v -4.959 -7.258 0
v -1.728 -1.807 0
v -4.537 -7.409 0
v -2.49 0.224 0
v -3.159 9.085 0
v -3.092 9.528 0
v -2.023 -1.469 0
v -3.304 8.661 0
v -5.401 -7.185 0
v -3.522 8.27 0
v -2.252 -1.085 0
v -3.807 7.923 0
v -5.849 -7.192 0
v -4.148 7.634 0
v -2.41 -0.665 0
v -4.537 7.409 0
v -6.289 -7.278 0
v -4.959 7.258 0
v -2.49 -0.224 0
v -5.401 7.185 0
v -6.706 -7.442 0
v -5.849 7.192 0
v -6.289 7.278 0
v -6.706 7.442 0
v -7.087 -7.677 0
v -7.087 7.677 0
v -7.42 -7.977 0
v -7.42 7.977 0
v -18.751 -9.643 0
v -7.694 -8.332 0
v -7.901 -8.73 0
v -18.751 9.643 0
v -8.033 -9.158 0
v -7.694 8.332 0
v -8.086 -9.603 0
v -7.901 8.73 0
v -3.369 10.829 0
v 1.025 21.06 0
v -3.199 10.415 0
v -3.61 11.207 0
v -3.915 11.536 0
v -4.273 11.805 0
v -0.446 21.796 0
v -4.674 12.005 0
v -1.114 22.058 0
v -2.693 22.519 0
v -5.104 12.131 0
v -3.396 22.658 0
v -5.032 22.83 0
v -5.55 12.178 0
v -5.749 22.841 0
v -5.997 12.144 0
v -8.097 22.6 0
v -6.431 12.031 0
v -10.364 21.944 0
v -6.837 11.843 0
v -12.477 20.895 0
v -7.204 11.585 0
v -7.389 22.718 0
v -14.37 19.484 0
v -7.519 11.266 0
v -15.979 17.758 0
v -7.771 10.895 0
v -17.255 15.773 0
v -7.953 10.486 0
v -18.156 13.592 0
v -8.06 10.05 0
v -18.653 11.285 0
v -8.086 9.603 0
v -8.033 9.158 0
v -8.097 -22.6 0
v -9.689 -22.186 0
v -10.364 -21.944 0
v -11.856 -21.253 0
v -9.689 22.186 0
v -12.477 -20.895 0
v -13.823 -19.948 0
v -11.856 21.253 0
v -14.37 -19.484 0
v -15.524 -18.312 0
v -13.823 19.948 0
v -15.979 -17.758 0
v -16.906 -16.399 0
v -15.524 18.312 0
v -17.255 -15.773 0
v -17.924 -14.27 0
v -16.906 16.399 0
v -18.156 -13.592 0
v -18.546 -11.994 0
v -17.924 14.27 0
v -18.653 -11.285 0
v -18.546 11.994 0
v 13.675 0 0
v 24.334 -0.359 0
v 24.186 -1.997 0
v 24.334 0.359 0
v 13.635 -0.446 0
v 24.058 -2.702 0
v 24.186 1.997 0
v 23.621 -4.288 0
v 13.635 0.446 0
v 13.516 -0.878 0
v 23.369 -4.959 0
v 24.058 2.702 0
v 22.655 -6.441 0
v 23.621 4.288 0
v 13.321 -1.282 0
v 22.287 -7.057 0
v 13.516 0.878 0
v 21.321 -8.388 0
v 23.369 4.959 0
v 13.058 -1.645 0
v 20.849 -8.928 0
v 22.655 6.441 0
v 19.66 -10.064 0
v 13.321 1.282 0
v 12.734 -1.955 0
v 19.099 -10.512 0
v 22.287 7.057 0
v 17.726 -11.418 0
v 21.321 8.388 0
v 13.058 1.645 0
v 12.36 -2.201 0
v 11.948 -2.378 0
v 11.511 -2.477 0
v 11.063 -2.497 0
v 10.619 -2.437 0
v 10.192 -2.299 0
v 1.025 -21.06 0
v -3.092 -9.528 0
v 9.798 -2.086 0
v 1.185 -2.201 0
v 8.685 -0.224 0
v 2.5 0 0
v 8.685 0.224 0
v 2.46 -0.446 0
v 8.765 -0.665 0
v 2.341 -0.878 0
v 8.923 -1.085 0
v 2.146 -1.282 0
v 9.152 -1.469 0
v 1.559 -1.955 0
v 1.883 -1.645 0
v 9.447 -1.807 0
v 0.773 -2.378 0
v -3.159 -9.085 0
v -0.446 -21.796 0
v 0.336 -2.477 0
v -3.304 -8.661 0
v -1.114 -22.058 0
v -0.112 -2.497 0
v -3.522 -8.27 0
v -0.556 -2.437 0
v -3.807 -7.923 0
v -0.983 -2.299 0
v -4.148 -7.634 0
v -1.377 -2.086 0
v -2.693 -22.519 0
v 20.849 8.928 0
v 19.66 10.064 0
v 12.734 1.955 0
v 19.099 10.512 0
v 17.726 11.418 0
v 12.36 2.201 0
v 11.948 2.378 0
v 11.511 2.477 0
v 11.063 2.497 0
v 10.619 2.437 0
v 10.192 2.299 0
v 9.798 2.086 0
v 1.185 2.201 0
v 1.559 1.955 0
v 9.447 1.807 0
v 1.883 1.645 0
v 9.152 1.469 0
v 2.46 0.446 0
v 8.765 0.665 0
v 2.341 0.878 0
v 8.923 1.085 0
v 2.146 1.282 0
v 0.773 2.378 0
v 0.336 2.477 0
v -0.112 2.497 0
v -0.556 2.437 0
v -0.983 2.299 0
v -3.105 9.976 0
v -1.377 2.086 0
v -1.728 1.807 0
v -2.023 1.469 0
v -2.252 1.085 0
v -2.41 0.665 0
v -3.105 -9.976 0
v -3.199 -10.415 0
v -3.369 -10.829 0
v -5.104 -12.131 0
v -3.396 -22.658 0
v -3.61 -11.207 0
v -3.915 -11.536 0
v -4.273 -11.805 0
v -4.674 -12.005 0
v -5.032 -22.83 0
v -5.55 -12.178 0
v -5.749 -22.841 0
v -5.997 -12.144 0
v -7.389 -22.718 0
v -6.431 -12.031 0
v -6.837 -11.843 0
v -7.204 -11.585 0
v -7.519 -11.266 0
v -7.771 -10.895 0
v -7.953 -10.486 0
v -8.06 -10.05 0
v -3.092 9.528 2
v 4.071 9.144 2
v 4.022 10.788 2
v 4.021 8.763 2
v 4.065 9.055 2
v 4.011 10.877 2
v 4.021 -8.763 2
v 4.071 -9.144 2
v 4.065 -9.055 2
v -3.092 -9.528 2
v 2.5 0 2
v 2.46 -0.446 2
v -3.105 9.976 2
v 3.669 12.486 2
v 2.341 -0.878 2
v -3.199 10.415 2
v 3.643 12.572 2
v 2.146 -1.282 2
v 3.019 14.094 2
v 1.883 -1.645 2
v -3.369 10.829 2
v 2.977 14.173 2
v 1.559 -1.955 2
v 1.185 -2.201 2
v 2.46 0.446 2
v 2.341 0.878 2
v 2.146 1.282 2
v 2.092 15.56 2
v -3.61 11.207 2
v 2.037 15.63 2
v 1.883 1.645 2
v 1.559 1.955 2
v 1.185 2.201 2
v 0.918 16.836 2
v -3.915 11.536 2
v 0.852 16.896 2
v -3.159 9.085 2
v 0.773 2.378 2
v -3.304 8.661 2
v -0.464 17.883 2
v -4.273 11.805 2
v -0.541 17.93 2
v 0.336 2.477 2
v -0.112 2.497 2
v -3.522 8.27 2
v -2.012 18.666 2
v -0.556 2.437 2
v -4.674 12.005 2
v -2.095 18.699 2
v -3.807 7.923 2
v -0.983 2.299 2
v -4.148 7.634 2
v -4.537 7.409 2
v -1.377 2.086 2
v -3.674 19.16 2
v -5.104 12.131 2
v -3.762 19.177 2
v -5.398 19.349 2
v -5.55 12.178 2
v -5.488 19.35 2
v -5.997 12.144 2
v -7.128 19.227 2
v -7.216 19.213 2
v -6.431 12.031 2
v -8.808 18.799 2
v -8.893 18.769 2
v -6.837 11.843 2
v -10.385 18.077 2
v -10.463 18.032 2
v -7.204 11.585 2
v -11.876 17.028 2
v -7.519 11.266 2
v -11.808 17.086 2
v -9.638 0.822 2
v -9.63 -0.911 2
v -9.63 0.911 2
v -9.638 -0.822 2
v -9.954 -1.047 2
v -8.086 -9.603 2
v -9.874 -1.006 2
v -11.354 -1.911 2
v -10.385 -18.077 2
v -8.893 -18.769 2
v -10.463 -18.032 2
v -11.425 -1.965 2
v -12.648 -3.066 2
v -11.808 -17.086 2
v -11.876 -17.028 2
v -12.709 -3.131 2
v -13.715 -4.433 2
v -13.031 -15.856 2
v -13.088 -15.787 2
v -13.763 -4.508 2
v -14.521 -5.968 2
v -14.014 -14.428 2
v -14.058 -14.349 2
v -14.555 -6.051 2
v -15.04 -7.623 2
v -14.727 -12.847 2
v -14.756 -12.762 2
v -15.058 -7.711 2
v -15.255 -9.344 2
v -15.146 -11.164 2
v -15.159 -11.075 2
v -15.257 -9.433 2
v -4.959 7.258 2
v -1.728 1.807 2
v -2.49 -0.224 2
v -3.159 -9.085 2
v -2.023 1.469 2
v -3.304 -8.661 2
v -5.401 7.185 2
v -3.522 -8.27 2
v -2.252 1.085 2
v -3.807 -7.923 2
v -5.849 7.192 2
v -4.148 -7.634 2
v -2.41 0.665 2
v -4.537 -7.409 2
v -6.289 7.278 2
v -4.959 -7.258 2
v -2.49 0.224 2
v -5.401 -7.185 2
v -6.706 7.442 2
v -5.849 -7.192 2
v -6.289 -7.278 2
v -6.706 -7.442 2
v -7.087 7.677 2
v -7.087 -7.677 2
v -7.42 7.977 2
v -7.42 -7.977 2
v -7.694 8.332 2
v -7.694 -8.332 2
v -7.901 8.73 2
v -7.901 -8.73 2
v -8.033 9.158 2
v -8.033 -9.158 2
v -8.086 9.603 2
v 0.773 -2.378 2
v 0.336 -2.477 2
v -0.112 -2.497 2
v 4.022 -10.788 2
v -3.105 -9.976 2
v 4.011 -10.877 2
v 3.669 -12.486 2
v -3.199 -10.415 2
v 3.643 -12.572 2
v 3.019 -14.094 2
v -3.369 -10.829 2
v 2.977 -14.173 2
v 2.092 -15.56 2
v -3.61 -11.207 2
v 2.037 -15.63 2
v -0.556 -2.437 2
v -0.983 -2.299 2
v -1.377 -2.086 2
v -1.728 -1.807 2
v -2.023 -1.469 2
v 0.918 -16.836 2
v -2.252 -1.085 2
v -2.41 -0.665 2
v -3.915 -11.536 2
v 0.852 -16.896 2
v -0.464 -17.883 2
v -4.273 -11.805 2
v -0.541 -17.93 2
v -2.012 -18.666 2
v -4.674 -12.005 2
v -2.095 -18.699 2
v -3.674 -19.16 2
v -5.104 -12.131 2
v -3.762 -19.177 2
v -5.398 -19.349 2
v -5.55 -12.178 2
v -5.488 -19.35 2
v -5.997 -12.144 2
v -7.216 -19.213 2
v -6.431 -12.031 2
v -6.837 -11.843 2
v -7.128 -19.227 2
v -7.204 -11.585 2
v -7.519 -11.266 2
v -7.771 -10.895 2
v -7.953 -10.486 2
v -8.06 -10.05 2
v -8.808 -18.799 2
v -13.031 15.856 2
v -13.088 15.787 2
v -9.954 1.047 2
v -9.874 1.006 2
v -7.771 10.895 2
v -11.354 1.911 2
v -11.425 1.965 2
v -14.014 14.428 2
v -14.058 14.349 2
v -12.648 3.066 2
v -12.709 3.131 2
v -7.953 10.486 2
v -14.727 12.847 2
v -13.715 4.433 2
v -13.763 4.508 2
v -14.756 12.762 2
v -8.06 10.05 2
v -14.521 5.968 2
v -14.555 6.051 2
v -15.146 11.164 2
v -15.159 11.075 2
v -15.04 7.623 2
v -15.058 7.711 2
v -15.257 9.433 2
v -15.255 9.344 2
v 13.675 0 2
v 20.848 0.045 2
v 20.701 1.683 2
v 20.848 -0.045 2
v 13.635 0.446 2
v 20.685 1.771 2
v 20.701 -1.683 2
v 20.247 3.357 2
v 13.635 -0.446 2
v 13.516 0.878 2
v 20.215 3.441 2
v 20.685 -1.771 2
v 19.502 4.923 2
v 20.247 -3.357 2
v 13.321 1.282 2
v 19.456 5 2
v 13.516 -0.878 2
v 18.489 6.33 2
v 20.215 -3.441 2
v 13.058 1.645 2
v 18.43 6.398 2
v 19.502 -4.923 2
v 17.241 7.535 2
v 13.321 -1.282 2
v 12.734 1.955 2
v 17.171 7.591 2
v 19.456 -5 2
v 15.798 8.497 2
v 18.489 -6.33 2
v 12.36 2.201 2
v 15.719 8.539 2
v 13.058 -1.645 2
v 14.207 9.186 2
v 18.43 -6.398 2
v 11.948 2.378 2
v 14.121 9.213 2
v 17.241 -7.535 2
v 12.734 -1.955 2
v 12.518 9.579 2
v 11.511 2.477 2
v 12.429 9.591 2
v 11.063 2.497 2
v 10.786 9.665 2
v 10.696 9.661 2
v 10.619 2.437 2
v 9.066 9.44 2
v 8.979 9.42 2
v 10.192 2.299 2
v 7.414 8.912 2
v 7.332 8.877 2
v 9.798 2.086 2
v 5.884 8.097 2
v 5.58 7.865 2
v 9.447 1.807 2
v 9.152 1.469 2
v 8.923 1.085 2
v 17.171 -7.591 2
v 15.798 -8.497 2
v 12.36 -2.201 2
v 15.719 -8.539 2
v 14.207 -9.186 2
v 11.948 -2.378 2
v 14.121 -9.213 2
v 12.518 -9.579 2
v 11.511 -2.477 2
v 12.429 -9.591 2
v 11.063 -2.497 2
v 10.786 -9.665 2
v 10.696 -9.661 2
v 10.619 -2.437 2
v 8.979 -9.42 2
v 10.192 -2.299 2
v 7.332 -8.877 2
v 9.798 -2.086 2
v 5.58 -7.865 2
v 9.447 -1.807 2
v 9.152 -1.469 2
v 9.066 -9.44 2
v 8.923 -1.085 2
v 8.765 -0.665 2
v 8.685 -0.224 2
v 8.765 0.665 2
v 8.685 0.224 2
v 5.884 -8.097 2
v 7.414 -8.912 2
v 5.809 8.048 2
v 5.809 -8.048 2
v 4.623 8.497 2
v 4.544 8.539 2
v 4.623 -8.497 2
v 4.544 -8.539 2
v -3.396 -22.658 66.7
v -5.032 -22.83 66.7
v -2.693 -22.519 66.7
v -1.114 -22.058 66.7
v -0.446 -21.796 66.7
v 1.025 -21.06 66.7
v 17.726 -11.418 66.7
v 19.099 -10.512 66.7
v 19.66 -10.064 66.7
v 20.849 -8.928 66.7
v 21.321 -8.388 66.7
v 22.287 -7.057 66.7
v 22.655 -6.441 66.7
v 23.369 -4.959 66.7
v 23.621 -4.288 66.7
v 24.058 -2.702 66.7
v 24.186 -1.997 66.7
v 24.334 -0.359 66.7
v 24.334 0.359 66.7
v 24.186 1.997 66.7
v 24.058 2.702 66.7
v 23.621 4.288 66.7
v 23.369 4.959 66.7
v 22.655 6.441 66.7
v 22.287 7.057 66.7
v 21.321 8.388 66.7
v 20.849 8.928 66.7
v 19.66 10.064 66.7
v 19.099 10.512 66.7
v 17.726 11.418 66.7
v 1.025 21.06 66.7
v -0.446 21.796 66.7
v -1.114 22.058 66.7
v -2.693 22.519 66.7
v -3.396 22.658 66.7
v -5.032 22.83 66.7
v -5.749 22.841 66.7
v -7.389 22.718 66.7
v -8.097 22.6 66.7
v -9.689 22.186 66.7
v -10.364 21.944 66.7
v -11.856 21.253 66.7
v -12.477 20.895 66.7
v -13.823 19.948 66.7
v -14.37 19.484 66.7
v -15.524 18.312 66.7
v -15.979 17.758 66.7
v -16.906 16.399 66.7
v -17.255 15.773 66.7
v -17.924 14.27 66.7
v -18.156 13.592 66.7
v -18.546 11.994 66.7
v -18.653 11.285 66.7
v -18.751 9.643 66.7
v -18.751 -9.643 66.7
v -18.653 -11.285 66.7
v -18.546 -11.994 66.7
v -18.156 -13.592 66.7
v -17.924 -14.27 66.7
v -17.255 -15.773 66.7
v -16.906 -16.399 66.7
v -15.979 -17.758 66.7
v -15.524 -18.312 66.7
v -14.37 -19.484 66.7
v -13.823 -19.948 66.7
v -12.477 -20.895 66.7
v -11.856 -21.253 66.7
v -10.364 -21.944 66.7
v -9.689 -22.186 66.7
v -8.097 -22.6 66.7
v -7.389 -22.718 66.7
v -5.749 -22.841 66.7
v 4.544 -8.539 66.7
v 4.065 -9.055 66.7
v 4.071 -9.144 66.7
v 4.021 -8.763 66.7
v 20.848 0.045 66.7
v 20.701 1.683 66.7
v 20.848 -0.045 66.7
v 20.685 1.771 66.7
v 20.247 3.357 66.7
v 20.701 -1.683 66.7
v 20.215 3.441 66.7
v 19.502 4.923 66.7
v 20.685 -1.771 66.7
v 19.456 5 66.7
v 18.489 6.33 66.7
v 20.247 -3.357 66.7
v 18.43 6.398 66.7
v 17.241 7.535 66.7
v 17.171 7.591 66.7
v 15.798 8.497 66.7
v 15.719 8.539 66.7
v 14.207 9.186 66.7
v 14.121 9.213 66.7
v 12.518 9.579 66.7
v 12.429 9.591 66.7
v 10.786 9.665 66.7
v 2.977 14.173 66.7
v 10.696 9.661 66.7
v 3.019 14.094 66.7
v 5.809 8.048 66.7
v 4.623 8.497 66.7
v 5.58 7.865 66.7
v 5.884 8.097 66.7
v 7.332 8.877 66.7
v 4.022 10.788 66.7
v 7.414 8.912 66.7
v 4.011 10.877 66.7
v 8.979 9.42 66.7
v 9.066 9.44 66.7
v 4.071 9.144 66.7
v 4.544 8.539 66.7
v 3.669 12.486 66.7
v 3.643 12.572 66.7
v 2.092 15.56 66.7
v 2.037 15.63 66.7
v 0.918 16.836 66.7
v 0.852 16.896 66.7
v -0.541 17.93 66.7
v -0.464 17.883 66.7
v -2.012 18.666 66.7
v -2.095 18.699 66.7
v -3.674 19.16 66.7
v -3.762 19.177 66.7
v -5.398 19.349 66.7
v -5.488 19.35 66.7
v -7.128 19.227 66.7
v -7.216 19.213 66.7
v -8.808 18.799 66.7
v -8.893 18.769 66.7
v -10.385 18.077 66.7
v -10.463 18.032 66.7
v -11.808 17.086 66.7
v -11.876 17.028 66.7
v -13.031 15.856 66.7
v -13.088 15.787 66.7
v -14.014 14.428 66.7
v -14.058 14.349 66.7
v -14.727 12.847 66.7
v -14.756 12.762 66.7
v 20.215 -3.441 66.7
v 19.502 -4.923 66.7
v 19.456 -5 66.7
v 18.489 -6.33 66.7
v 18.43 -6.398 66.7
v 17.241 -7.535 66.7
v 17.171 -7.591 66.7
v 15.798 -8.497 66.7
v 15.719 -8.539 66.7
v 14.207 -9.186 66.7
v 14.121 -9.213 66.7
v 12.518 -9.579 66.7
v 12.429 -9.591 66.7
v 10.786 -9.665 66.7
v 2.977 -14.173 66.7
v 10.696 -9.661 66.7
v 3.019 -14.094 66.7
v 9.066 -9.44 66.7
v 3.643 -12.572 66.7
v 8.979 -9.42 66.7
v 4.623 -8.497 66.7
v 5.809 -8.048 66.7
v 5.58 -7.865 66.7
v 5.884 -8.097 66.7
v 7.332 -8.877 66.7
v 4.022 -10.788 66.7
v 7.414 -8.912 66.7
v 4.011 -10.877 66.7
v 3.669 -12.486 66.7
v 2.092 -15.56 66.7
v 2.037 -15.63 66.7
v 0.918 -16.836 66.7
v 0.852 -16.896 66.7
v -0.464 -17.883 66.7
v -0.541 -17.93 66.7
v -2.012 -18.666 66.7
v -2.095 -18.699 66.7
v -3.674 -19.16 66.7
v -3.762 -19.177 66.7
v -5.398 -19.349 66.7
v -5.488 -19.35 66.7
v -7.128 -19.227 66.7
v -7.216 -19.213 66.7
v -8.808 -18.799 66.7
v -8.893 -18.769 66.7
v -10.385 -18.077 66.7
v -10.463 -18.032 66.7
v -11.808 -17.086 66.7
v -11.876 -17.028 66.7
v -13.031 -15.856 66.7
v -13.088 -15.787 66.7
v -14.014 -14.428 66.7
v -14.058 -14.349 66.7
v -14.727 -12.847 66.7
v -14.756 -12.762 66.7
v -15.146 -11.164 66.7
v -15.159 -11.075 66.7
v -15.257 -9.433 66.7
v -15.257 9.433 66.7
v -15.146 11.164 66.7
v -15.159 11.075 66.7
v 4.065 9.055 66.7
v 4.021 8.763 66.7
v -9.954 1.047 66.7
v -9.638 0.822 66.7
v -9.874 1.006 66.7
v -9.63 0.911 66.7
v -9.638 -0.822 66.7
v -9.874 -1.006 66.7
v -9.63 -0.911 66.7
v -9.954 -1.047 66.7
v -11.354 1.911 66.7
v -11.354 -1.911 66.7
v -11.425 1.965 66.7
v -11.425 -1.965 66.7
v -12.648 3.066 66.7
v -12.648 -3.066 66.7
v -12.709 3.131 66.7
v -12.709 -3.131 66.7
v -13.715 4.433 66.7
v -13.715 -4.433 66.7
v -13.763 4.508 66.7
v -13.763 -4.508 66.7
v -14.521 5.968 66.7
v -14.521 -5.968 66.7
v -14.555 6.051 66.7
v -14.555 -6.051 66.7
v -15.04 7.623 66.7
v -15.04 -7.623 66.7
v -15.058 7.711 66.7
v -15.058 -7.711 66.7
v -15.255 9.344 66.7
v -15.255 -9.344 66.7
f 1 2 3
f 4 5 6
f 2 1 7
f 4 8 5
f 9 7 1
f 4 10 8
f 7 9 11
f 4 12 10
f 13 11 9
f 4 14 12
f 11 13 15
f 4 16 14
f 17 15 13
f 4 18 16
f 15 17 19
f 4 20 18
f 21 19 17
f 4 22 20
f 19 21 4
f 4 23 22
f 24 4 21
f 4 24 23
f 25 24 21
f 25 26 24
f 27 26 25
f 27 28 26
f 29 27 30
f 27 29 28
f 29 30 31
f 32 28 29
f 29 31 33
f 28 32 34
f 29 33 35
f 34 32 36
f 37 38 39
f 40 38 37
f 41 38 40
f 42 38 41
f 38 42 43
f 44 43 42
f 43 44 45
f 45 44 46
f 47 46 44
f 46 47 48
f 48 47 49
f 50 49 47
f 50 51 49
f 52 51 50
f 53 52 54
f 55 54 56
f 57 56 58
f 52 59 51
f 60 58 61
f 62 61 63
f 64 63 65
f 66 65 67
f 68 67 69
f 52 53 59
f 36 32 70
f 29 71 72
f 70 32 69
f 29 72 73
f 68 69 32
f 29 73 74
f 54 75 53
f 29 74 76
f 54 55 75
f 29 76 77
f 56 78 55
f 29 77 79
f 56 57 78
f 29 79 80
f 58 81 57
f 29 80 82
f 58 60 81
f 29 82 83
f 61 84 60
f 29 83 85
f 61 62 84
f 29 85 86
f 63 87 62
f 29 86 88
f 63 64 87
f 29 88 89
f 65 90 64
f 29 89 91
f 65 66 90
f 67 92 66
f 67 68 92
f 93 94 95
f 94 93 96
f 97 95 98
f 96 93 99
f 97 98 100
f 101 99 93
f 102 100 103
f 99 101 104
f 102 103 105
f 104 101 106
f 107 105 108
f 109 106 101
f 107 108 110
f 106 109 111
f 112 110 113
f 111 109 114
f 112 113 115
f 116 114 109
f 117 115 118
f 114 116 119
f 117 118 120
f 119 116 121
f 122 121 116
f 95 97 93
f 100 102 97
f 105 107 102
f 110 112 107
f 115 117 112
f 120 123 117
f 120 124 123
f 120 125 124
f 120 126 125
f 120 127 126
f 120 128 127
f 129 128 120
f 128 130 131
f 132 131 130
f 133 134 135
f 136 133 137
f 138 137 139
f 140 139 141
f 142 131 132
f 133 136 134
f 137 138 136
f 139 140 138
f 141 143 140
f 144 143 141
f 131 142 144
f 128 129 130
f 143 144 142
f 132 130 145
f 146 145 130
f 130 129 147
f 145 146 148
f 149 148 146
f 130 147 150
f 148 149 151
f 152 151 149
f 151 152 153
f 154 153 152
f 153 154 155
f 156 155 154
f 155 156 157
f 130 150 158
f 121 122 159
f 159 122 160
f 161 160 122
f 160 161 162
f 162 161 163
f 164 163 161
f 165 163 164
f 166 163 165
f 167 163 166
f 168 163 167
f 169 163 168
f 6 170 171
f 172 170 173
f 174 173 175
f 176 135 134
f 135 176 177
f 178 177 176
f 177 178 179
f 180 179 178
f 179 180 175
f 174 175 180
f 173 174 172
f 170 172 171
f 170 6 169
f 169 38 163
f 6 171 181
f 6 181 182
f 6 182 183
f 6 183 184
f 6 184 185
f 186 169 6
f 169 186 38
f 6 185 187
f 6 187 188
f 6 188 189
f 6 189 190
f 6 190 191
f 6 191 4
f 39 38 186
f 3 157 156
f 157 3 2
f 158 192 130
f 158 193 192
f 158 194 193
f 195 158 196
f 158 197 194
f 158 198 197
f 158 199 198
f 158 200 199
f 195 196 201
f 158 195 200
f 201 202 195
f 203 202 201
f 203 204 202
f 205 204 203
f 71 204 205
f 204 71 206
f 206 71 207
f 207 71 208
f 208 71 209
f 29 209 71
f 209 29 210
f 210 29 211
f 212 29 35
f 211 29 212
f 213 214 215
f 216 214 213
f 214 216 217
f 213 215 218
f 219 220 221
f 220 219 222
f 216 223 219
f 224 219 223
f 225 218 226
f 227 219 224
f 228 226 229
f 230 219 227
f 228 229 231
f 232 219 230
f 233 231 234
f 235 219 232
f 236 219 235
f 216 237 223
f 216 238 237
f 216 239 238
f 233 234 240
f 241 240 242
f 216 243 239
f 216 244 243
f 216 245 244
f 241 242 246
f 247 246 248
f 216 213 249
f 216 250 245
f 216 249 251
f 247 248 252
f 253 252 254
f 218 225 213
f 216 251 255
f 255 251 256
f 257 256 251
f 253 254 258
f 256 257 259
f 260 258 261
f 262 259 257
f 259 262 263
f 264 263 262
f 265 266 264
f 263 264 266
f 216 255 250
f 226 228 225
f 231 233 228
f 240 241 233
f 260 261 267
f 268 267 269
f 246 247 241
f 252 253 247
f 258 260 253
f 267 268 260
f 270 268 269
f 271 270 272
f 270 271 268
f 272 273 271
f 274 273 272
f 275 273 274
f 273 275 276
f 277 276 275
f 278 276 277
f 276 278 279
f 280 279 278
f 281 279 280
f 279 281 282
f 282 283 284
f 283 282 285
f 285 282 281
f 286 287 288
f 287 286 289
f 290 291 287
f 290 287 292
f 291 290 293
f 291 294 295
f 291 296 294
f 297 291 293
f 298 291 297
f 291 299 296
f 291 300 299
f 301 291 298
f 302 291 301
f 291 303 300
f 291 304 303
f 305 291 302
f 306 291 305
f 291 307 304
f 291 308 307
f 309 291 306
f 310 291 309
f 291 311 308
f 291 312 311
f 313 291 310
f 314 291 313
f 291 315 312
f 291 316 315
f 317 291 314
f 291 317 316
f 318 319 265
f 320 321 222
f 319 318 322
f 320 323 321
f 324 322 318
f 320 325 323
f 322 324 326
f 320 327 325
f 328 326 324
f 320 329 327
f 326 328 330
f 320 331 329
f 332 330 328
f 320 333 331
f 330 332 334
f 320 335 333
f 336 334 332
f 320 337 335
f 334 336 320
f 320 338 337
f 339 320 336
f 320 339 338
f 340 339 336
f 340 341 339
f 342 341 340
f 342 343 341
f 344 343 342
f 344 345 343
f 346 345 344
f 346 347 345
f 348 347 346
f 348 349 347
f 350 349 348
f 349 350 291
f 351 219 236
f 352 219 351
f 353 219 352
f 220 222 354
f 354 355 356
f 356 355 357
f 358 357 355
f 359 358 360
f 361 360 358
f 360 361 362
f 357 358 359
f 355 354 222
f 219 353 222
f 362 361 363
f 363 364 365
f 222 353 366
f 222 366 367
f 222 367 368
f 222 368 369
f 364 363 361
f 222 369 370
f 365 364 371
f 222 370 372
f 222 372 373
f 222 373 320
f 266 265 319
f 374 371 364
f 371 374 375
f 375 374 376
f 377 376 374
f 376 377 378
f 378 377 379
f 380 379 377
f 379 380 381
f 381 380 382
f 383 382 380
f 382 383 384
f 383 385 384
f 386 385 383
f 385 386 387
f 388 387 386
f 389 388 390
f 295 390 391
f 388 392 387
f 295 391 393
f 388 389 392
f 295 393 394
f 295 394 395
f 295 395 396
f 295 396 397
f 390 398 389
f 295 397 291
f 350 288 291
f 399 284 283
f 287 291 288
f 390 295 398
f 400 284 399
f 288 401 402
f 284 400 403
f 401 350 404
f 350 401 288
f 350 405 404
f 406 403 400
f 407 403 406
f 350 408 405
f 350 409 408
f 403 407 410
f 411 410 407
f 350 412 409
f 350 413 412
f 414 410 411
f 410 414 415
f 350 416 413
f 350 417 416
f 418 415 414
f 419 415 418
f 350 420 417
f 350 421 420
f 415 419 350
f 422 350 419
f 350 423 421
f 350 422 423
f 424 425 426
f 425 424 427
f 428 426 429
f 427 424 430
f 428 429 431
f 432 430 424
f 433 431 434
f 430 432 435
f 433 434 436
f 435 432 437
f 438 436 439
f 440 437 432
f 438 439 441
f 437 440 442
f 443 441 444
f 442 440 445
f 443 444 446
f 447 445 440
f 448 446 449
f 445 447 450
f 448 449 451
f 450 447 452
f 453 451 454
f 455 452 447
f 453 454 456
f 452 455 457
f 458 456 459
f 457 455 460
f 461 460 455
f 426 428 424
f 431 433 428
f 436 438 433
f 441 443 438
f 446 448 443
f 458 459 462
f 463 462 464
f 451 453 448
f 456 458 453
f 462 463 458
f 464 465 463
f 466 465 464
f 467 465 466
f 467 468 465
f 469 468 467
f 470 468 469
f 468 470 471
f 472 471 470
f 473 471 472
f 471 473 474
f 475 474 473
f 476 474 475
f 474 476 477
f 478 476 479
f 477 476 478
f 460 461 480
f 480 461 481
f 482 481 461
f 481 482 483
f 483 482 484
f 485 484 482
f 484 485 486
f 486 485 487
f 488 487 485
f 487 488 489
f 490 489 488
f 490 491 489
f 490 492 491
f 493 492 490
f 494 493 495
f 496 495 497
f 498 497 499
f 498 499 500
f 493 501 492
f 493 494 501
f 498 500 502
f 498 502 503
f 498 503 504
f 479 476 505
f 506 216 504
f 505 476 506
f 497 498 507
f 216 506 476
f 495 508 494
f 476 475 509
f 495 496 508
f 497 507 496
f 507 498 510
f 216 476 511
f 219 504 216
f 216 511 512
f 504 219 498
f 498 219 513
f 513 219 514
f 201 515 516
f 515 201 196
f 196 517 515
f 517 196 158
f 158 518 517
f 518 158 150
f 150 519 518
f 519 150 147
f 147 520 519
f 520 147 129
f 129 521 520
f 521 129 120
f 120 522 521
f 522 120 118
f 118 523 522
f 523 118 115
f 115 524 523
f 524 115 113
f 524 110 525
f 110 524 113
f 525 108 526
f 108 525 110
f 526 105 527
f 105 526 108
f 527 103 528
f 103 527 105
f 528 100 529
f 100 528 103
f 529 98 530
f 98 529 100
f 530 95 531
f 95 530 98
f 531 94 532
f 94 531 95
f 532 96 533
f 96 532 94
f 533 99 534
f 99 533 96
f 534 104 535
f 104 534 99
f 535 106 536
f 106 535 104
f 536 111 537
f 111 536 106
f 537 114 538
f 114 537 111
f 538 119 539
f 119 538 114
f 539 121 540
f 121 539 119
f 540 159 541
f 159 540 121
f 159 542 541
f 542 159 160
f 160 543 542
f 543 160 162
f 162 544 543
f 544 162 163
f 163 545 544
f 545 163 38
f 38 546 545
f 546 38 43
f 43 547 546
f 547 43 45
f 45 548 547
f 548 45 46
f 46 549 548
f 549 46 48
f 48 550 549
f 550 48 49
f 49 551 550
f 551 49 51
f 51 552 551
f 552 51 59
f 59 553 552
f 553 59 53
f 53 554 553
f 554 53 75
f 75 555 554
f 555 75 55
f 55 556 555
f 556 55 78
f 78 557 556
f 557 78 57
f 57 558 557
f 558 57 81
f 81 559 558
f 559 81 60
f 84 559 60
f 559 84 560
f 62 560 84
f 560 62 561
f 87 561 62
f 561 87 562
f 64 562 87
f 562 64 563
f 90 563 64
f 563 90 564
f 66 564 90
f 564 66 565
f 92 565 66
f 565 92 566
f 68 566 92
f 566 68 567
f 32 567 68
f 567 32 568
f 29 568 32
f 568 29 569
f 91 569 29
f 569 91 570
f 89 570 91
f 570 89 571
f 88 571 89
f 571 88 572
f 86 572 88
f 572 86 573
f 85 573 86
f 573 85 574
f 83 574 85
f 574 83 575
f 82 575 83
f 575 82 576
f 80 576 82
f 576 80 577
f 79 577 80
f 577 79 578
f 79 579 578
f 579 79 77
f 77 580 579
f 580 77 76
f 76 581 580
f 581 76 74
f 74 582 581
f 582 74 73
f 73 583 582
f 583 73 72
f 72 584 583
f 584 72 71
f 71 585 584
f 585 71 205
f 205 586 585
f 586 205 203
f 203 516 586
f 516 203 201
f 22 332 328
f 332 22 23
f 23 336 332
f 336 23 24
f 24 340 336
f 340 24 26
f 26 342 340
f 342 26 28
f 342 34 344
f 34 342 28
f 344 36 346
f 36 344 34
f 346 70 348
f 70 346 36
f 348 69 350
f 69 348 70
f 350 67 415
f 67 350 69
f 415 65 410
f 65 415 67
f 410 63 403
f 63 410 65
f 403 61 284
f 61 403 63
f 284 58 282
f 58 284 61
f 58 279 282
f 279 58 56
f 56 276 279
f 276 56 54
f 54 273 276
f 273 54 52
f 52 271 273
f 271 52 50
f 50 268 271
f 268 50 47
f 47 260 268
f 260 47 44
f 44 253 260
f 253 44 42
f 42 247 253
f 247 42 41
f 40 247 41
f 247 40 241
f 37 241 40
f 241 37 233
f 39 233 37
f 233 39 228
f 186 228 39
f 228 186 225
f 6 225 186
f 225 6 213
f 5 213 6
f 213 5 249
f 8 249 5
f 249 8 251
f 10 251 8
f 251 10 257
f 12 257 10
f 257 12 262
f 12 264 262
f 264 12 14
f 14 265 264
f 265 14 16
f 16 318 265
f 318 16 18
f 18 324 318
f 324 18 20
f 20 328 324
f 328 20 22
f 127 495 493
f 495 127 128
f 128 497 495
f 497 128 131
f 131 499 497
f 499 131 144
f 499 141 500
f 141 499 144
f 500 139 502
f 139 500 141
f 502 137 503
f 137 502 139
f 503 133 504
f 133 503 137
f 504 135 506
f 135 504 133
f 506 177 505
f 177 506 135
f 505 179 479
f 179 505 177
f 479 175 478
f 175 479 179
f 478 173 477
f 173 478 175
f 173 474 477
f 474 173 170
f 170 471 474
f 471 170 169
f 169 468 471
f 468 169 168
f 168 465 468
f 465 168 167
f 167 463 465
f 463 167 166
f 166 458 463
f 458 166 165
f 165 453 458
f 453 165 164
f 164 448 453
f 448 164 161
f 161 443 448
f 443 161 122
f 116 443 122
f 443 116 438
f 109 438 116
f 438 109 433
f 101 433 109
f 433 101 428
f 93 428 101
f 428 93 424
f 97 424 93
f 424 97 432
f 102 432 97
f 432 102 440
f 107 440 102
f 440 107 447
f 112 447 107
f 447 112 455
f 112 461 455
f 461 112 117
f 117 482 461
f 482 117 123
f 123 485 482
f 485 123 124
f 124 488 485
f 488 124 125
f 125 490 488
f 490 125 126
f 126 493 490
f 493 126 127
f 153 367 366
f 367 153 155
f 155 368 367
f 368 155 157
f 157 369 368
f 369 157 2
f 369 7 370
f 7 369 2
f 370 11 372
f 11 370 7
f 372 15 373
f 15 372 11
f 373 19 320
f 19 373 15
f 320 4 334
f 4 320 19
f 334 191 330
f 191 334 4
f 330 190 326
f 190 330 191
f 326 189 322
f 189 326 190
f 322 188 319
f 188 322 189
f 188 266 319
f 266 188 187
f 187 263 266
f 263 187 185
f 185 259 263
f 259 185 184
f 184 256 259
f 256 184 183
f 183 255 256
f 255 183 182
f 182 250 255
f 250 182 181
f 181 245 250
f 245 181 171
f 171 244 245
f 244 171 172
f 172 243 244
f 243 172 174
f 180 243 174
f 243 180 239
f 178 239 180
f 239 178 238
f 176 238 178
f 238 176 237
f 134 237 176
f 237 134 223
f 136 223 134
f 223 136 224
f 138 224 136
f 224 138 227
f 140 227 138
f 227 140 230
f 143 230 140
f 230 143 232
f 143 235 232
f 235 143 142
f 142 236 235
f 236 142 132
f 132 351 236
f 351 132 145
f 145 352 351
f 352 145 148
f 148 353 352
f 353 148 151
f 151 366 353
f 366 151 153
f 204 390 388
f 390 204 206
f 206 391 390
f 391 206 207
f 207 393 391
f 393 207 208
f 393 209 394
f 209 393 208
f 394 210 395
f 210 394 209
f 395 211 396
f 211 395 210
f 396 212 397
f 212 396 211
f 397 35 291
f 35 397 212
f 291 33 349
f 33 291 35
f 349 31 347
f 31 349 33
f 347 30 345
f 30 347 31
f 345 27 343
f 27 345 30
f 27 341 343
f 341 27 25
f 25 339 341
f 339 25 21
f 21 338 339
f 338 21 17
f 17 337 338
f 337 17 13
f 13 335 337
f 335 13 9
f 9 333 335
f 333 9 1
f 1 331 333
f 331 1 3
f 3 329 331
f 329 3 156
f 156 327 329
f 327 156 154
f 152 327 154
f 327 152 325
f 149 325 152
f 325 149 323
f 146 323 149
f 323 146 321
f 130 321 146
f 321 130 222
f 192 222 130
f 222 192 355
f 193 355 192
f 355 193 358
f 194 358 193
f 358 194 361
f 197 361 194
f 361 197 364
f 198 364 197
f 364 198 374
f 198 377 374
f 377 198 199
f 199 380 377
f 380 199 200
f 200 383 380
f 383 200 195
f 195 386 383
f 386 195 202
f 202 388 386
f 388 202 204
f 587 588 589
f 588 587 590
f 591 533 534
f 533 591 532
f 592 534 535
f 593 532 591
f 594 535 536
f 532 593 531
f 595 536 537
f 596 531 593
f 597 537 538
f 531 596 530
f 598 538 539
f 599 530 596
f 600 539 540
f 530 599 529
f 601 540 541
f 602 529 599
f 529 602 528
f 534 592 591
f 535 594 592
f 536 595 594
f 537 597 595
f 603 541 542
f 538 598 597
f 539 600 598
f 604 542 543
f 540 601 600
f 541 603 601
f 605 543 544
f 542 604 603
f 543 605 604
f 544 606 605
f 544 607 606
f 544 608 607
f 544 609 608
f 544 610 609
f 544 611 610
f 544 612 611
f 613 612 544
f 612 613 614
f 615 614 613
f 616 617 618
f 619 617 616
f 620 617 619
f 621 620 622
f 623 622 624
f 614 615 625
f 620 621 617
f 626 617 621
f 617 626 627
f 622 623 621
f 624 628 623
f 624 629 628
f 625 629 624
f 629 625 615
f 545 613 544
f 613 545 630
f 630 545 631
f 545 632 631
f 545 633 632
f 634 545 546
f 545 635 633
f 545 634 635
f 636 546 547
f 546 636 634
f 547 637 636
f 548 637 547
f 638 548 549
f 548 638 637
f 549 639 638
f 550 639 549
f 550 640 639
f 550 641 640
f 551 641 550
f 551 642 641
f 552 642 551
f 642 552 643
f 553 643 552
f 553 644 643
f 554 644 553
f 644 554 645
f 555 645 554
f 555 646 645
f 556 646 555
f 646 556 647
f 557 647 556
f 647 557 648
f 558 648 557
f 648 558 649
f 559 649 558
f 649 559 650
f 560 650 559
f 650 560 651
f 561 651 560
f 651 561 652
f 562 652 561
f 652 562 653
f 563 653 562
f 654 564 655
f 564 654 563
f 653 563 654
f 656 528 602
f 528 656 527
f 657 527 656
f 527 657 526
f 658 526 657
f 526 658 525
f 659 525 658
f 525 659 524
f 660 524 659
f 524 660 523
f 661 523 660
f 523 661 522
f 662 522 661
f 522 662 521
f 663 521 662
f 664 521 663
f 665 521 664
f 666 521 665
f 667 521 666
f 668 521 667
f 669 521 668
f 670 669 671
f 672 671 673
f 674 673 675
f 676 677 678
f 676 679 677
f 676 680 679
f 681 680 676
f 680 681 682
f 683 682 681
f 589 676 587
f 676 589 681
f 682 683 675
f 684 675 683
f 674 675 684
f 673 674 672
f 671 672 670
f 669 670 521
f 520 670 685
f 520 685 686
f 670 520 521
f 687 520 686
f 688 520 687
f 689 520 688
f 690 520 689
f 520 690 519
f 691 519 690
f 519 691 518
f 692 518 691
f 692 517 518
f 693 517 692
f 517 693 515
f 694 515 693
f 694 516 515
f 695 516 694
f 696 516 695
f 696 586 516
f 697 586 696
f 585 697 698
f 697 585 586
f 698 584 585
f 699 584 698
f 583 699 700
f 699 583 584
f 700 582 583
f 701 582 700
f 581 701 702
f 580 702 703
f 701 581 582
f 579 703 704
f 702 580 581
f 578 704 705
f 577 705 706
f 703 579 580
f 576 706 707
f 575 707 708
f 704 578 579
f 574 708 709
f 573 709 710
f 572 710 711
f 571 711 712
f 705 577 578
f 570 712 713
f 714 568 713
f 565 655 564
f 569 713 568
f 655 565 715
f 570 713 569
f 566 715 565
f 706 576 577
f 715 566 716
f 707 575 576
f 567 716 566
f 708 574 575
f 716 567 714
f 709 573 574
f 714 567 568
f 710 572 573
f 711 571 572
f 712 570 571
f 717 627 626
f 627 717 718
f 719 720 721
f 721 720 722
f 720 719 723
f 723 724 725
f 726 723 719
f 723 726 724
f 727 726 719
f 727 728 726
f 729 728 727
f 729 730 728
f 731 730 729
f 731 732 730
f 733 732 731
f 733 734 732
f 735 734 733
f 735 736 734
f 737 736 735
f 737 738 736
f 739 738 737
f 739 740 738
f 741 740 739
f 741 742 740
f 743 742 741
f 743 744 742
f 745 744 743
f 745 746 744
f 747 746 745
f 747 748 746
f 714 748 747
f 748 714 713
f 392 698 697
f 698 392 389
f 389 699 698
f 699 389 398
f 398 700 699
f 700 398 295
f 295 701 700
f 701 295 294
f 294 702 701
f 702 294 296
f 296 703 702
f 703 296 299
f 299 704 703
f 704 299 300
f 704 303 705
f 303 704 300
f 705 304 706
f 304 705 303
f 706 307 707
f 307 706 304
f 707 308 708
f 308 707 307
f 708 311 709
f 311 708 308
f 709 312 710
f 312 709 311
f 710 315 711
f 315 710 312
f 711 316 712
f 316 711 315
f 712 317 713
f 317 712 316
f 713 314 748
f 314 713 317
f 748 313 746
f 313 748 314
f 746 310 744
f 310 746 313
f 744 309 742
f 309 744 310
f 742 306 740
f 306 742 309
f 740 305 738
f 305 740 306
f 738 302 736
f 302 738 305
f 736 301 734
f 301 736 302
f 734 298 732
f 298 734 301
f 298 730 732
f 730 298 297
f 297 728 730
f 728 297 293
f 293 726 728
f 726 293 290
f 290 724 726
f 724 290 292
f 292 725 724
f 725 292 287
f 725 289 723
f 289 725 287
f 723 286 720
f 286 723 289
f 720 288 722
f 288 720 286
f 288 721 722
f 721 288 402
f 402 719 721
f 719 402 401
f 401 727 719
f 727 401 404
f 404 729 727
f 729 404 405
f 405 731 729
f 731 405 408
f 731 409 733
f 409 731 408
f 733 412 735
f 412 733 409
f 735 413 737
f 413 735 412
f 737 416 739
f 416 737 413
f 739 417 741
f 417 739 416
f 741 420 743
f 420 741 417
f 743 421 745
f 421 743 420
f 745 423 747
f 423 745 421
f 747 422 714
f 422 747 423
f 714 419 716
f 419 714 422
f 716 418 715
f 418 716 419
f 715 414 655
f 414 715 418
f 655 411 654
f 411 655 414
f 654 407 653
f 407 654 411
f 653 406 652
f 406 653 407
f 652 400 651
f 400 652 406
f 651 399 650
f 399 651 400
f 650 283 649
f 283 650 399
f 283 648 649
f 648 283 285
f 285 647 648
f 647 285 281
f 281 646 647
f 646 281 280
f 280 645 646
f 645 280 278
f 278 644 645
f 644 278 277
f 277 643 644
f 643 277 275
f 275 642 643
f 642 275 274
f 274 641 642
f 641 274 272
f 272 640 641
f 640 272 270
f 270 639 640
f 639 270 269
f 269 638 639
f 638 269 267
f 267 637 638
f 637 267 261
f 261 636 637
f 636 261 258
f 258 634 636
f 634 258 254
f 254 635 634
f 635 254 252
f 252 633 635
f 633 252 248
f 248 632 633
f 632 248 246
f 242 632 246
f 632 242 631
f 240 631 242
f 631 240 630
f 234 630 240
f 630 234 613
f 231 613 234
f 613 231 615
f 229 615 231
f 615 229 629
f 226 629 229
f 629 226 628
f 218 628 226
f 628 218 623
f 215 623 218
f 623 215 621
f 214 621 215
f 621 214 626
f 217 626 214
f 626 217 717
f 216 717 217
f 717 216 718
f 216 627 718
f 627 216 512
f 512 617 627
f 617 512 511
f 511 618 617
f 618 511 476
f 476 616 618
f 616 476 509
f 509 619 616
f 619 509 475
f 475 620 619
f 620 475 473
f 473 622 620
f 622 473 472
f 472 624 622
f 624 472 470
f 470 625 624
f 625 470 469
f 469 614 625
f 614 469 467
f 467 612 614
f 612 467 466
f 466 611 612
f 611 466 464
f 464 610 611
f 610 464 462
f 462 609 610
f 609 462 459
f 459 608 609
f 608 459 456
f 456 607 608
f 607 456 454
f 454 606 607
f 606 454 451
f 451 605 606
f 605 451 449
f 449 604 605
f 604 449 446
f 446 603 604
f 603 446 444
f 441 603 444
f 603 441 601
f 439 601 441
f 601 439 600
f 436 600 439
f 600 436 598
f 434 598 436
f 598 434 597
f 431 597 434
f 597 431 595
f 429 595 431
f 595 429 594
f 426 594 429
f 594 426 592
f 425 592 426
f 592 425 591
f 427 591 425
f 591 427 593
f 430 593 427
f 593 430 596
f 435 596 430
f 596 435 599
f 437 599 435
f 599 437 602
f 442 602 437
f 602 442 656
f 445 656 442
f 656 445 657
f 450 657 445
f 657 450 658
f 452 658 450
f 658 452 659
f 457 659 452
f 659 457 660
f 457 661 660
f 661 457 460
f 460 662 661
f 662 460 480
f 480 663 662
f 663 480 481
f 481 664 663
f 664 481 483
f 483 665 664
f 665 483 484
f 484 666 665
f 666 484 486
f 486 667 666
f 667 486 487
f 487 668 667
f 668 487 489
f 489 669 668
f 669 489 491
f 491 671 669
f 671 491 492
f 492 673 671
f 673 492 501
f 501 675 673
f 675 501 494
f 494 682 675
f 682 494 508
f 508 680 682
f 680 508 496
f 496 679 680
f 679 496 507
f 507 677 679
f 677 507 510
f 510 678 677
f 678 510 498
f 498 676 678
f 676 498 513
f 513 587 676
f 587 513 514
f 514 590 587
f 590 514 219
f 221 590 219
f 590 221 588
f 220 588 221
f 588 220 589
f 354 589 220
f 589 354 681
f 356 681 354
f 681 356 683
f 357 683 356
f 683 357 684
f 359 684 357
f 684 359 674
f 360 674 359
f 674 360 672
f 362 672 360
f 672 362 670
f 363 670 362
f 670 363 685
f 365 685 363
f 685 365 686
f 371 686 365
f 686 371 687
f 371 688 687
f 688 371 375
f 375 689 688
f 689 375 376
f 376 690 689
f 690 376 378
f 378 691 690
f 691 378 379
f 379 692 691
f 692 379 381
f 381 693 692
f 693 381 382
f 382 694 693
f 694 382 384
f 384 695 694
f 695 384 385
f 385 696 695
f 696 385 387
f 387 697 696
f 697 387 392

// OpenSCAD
module 2dTri18650(diameter=18.35, distance=(18.35/2)+2) {
  radius = (diameter/2);

  for (i = [0:2])
  rotate(360/3*i)
  translate([distance,0])
  circle(r=radius, $fn=35);

  // Central cutout
  circle(r=radius, $fn=35);
}

module Tri18650(length=64.7, floorHeight=2, clearance=0.5, wall=4) {
  union() {

    linear_extrude(height=floorHeight)
    difference() {
      hull()
      offset(r=wall)
      2dTri18650();

      2dTri18650(diameter=5);
    }

    translate([0,0,floorHeight])
    linear_extrude(height=length)
    difference() {
      hull()
      offset(r=wall)
      2dTri18650();

      offset(r=clearance)
      2dTri18650();
    }
  }
}

*for (i=[0:2])
rotate(60+(120*i))
translate([(8+(18.35*0.58))*2,0,0])
Tri18650();

Tri18650();
